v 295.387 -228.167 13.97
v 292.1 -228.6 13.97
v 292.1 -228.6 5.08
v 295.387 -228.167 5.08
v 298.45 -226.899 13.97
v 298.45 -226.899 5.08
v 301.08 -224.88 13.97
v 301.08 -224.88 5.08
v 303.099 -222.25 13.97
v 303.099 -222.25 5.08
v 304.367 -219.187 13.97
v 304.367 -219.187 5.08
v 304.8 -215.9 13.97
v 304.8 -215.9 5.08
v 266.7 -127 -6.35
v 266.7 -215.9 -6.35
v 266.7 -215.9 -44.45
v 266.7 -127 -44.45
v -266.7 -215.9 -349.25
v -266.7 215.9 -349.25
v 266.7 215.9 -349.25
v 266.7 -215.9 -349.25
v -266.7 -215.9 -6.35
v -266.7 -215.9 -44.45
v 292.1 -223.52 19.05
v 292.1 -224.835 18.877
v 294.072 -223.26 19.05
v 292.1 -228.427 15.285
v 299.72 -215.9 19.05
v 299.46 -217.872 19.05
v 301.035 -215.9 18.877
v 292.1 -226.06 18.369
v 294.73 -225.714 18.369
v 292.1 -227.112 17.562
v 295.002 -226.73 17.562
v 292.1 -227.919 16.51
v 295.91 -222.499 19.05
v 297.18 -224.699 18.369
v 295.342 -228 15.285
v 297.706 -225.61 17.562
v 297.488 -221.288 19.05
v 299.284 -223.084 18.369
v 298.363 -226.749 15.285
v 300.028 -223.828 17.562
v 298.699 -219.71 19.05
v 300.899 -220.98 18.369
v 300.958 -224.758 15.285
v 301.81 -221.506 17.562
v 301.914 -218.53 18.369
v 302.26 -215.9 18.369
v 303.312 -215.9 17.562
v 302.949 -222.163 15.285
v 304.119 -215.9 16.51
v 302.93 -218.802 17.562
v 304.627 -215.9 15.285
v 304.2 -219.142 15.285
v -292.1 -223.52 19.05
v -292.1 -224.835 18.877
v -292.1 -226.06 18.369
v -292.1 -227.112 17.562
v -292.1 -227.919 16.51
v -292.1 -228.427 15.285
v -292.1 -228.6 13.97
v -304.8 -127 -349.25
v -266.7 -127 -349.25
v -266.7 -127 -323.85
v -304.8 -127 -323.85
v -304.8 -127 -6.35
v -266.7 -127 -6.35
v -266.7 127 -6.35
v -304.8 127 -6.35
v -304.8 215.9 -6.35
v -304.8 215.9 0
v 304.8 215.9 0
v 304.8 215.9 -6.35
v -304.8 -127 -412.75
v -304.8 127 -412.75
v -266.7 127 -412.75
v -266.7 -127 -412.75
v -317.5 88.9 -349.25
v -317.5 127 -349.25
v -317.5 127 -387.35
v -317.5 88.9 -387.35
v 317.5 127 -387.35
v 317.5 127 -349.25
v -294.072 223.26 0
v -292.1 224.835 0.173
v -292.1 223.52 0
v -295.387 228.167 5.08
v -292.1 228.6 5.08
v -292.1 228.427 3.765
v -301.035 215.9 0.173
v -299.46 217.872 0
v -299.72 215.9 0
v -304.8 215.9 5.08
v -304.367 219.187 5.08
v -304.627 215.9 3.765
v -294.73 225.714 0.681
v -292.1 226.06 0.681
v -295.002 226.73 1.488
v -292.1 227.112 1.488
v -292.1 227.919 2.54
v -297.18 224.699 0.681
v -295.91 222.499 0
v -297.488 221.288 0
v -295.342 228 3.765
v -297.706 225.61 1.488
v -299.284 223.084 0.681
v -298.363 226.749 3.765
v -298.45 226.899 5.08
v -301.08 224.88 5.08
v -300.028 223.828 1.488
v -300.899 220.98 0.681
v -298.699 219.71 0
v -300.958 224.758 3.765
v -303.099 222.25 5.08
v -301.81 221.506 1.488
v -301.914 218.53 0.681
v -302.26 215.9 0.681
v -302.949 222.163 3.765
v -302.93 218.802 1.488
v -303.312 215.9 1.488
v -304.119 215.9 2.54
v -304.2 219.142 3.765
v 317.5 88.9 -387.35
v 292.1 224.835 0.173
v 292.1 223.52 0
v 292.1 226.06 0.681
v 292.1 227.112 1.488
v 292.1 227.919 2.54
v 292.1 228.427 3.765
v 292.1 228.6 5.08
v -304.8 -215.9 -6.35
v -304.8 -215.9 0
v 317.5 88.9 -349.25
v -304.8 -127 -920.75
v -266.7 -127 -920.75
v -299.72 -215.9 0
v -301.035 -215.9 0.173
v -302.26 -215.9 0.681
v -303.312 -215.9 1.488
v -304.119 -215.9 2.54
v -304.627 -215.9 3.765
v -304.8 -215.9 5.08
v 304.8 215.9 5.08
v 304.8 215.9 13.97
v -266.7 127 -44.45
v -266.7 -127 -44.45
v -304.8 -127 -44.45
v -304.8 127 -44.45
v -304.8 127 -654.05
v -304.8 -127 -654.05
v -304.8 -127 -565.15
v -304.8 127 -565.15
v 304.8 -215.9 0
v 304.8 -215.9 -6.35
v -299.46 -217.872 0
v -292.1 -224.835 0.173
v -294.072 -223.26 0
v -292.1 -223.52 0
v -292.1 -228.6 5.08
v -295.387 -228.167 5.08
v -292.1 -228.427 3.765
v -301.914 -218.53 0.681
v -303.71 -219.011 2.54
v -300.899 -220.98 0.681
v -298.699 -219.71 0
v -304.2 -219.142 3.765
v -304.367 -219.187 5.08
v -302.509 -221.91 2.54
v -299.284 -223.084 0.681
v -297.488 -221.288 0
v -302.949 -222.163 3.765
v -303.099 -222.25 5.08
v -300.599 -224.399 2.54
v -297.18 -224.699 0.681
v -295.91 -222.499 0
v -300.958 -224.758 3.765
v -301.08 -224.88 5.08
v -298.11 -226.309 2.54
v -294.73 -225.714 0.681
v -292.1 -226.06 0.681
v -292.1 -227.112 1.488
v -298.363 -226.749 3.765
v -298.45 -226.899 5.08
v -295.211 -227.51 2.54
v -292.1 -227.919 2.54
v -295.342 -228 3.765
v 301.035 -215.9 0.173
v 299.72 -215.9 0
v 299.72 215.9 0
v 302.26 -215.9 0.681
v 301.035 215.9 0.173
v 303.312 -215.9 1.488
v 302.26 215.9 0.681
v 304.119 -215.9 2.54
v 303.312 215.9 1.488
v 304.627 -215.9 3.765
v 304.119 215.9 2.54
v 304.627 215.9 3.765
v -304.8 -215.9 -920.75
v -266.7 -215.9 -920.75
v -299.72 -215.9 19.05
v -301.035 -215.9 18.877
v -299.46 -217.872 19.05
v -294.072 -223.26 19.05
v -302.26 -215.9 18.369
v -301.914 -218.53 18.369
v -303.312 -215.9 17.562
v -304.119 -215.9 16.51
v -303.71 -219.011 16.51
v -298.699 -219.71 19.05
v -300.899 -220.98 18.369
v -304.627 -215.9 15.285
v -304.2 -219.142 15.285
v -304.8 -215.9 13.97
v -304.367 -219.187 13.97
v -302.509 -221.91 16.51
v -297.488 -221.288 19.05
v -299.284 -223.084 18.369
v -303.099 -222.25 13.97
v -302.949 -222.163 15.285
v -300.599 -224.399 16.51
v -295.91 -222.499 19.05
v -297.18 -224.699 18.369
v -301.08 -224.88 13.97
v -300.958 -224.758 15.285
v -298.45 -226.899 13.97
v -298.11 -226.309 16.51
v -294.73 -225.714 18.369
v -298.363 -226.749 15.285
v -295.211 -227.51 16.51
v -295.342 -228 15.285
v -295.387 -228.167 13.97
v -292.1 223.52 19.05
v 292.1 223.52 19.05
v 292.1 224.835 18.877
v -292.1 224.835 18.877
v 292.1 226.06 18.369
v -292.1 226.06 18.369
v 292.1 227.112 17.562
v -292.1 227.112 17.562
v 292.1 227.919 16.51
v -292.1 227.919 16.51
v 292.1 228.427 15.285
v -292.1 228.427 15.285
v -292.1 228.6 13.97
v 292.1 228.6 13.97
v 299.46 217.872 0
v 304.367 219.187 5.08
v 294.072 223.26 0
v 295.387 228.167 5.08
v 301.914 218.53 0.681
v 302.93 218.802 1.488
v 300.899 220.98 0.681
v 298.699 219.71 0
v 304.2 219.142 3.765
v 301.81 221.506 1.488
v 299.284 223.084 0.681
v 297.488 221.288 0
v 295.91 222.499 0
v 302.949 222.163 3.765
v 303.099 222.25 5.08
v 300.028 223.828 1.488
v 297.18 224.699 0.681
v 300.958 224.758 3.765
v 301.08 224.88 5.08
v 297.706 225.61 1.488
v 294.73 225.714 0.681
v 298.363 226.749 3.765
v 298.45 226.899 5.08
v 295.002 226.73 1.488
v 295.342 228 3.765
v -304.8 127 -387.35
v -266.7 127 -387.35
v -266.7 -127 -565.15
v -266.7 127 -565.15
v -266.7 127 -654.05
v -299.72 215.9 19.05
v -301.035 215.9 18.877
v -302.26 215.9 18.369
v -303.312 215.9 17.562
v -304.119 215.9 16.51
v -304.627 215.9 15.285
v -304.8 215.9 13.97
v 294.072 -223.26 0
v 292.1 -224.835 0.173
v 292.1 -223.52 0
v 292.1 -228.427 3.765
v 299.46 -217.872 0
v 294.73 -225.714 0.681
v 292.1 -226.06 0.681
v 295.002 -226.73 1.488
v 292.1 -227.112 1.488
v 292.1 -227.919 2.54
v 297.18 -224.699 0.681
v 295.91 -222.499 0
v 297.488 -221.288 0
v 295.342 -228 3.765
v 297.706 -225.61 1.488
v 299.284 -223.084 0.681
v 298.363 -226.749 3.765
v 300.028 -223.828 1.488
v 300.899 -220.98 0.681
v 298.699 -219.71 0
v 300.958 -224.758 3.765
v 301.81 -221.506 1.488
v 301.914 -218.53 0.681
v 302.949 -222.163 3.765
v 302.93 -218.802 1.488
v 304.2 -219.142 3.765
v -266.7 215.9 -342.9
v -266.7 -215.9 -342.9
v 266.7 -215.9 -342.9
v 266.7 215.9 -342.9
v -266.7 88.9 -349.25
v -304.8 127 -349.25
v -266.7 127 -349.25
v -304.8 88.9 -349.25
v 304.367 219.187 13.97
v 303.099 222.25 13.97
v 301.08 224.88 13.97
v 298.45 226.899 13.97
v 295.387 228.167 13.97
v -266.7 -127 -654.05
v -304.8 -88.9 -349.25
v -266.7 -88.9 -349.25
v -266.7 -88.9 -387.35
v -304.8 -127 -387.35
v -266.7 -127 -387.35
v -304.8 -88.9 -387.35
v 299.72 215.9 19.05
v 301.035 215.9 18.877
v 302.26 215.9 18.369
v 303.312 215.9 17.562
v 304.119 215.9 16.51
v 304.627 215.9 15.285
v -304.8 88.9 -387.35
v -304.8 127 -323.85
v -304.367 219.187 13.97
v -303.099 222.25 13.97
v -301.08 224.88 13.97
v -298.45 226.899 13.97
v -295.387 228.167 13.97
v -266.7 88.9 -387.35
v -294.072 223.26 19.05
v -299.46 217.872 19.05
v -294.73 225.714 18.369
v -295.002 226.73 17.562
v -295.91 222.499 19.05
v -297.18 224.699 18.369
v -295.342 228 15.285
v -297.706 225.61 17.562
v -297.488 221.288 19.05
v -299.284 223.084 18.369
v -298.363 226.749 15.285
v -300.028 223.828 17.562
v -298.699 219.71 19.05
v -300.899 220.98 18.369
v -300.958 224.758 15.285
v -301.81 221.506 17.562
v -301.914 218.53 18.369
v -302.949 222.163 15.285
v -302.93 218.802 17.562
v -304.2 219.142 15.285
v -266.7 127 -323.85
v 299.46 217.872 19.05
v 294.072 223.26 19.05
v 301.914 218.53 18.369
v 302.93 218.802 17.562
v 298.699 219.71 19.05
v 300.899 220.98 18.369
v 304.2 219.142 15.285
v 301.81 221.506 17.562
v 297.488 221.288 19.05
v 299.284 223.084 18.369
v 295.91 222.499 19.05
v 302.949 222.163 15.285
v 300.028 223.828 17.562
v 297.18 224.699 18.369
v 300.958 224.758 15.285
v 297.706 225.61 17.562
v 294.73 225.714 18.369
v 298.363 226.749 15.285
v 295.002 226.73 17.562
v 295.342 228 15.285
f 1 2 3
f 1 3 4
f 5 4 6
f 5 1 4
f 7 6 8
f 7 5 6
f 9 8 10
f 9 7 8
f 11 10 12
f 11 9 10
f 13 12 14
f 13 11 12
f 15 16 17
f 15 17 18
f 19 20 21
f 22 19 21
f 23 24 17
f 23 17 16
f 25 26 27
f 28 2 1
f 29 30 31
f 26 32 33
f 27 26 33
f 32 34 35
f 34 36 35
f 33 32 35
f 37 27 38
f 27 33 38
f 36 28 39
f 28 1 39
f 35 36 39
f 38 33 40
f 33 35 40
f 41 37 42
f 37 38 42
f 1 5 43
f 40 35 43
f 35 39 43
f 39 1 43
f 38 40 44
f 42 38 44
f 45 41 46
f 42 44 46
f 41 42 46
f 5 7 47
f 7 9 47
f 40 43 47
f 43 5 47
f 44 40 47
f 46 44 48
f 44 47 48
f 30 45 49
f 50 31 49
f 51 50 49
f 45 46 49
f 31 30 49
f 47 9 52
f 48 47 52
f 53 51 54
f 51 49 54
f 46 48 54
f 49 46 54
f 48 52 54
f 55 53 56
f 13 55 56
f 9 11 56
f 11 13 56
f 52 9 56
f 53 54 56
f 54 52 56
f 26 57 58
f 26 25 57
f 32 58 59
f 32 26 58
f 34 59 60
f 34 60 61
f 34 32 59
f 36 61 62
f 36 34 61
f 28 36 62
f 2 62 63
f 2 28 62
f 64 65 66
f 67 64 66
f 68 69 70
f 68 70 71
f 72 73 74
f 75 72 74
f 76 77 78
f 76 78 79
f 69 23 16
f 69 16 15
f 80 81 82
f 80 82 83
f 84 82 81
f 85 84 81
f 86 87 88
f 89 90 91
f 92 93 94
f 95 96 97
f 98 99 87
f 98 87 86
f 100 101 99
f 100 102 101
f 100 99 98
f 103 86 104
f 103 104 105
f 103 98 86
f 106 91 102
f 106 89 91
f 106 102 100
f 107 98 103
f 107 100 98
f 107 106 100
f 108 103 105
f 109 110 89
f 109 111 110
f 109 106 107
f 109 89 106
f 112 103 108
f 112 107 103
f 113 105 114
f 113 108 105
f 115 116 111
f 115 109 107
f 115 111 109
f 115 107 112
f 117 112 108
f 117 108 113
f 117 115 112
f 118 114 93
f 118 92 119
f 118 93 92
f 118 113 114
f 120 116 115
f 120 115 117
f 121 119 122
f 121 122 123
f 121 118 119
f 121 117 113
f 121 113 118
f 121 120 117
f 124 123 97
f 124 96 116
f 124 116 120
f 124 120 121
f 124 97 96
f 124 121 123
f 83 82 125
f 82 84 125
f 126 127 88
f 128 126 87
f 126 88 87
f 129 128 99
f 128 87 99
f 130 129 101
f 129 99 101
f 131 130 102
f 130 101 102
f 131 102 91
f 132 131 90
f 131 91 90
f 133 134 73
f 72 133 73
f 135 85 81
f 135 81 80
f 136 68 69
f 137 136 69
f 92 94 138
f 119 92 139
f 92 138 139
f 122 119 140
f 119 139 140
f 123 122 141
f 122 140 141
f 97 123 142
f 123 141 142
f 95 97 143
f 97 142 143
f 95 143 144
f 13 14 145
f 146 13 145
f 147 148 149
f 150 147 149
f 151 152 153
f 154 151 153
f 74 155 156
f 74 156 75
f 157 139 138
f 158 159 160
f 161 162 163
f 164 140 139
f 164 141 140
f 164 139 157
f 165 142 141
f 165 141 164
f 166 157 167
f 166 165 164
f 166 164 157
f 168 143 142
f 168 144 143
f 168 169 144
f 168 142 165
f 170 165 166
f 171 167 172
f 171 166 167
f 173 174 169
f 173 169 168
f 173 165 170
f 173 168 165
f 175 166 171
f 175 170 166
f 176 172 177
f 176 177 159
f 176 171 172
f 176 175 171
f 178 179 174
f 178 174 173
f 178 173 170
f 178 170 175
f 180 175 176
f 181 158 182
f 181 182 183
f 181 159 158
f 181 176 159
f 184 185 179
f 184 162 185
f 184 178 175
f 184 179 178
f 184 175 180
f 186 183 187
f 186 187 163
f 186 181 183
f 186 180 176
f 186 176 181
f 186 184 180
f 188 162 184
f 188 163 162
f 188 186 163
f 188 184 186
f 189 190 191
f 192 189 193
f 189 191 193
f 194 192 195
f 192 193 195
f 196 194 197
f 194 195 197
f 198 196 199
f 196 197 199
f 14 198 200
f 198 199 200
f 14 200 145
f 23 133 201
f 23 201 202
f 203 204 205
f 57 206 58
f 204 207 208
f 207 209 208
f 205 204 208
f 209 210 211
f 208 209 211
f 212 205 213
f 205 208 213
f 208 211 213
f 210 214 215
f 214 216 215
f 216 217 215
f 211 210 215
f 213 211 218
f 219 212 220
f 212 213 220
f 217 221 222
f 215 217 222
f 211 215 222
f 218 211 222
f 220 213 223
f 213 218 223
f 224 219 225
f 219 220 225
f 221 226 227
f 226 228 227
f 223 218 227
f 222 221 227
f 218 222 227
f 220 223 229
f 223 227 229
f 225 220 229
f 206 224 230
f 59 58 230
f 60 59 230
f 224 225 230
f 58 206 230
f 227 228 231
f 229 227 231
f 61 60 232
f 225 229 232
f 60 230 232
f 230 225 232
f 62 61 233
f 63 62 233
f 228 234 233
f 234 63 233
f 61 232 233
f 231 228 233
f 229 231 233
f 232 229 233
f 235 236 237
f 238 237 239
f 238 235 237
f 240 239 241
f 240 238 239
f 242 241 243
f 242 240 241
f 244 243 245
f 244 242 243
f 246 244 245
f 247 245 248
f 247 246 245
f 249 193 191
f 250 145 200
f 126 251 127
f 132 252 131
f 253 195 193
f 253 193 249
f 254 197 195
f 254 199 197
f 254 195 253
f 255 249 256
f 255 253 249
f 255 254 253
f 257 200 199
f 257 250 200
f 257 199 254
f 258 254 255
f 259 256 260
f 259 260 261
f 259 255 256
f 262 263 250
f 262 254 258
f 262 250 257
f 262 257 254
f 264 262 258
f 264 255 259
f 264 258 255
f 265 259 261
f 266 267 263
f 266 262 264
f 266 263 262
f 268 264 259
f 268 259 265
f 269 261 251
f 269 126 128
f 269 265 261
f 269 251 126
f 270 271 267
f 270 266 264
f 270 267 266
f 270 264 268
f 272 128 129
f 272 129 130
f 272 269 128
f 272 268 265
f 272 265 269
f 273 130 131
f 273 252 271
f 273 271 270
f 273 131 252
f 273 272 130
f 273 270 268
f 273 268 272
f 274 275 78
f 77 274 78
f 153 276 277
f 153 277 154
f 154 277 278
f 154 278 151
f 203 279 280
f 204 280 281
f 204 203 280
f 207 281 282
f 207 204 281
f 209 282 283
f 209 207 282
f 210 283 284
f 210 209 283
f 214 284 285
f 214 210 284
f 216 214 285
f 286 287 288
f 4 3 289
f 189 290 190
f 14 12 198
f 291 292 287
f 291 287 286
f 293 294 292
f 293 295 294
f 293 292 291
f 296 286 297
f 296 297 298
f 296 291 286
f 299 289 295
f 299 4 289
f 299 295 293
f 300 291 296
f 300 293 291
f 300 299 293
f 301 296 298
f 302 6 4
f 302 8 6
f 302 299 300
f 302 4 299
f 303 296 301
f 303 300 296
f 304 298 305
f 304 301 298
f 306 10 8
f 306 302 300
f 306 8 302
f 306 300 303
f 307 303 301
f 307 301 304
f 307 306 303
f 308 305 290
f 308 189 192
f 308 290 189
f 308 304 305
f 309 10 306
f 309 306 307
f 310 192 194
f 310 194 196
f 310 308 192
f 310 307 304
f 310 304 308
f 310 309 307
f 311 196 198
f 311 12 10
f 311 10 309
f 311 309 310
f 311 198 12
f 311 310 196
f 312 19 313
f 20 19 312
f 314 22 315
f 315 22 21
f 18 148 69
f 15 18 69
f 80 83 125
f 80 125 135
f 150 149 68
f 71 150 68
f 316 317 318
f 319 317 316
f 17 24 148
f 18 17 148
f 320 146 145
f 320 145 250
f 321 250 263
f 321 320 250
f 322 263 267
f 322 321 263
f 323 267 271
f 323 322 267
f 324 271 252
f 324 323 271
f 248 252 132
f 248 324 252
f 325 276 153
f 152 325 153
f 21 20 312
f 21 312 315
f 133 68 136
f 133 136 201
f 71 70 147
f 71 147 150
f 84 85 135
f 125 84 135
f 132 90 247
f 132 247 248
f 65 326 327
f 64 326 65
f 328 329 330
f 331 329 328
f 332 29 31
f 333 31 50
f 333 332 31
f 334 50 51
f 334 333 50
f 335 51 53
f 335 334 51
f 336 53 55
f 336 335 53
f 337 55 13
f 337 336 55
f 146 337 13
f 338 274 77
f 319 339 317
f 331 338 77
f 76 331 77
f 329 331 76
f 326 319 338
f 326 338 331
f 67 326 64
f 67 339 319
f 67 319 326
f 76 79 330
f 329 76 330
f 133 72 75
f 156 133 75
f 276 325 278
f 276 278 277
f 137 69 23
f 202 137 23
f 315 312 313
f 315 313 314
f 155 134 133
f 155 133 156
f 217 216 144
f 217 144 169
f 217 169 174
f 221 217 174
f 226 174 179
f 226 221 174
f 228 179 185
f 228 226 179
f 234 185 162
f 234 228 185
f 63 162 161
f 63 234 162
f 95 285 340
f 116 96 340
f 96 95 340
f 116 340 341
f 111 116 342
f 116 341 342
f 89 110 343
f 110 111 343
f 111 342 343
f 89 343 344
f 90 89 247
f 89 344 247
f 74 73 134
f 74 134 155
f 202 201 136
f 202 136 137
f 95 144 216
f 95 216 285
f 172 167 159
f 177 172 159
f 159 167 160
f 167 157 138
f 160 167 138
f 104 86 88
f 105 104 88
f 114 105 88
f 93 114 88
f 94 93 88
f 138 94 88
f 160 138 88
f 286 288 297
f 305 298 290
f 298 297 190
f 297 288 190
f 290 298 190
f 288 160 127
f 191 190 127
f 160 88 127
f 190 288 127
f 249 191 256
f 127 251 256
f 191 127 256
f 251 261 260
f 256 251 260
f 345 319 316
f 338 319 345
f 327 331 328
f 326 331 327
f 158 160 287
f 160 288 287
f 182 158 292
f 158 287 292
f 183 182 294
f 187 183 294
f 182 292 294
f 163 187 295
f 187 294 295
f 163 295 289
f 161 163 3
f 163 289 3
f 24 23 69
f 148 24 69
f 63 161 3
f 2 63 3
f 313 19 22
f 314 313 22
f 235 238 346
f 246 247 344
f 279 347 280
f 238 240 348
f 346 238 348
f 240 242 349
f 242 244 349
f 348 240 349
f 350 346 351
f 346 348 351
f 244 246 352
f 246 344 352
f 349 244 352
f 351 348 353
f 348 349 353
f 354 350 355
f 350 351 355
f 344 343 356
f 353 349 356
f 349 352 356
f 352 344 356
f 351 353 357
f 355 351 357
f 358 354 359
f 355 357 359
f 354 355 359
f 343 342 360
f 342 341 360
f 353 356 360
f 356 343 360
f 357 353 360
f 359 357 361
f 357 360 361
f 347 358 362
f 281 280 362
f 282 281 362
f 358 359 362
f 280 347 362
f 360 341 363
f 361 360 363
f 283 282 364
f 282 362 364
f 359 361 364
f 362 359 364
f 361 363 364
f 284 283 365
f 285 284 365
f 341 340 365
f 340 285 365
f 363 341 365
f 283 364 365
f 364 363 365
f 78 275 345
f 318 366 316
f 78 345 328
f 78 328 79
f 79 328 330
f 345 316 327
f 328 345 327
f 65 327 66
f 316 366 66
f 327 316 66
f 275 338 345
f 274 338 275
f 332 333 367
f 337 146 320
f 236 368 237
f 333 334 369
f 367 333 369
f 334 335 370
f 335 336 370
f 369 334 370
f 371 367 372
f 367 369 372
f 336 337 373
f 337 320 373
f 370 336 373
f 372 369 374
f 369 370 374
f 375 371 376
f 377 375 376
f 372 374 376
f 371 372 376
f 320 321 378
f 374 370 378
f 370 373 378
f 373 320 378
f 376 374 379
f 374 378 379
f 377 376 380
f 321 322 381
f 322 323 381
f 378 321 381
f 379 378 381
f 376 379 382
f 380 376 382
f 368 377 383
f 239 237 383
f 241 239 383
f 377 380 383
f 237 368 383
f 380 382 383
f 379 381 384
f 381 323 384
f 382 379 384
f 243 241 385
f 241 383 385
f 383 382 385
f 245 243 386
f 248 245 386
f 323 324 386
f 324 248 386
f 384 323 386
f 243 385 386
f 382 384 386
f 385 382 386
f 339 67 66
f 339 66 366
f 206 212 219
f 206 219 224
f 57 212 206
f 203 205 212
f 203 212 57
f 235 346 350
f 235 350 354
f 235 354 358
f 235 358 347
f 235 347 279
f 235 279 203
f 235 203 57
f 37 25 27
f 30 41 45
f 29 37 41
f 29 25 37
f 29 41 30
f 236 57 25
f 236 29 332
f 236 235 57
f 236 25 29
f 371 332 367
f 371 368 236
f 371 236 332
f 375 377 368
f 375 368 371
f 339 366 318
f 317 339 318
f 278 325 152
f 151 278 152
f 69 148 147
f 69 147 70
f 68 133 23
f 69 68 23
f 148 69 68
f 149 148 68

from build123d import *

# Parameters (mm, degrees)
F0_W           = 609.6
F0_H           = 431.8
F1_DEPTH       = 6.35
F2_W           = 38.1
F2_H           = 88.9
F3_DEPTH       = 914.4
F4_W           = 88.9
F4_H           = 38.1
F5_DEPTH       = 533.4
F6_W           = 38.1
F6_H           = 38.1
F7_DEPTH       = 254
F8_W           = 38.1
F8_H           = 88.9
F9_DEPTH       = 254
F11_DEPTH      = 38.1
F12_W          = 38.1
F12_H          = 38.1
F13_DEPTH      = 622.3
F13_DEPTH_BACK = 12.7
F14_W          = 533.4
F14_H          = 431.8
F15_DEPTH      = 6.35
F16_W          = 609.6
F16_H          = 457.2
F17_DEPTH      = 19.05
F18_R          = 12.7
F19_R          = 5.08


with BuildPart() as f1:
    # F0 (on Top) → F1 (new body)
    with BuildSketch(Plane.XY):
        Rectangle(F0_W, F0_H)
    extrude(amount=-F1_DEPTH)


with BuildPart() as f3:
    # F2 (on face) → F3 (new body)
    with BuildSketch(Plane(origin=(0, 0, -6.35), x_dir=(1, 0, 0), z_dir=(0, 0, -1))):
        with Locations((-285.75, 171.45)):
            Rectangle(F2_W, F2_H)
    extrude(amount=F3_DEPTH)


with BuildPart() as f5:
    # F4 (on face) → F5 (new body)
    with BuildSketch(Plane.YZ.offset(-266.7)):
        with Locations((-171.45, -25.4)):
            Rectangle(F4_W, F4_H)
    extrude(amount=F5_DEPTH)


with BuildPart() as f7:
    # F6 (on face) → F7 (new body)
    with BuildSketch(Plane(origin=(0, -127, 0), x_dir=(-1, 0, 0), z_dir=(0, 1, 0))):
        with Locations((285.75, -25.4)):
            Rectangle(F6_W, F6_H)
    extrude(amount=F7_DEPTH)


with BuildPart() as f9:
    # F8 (on face) → F9 (new body)
    with BuildSketch(Plane(origin=(0, -127, 0), x_dir=(-1, 0, 0), z_dir=(0, 1, 0))):
        with Locations((285.75, -609.6)):
            Rectangle(F8_W, F8_H)
    extrude(amount=F9_DEPTH)


with BuildPart() as f11:
    # F10 (on face) → F11 (new body)
    with BuildSketch(Plane(origin=(-304.8, 0, 0), x_dir=(0, -1, 0), z_dir=(-1, 0, 0))):
        Polygon((127, -349.25), (127, -323.85), (-127, -323.85), (-127, -349.25), (-88.9, -349.25), (-88.9, -387.35), (-127, -387.35), (-127, -412.75), (127, -412.75), (127, -387.35), (88.9, -387.35), (88.9, -349.25), align=None)
    extrude(amount=-F11_DEPTH)


with BuildPart() as f13:
    # F12 (on face) → F13 (new body, two sides)
    with BuildSketch(Plane(origin=(-304.8, 0, 0), x_dir=(0, -1, 0), z_dir=(-1, 0, 0))) as f13_sk:
        with Locations((-107.95, -368.3)):
            Rectangle(F12_W, F12_H)
    extrude(amount=-F13_DEPTH)
    extrude(f13_sk.sketch, amount=F13_DEPTH_BACK)


with BuildPart() as f15:
    # F14 (on face) → F15 (new body)
    with BuildSketch(Plane.XY.offset(-349.25)):
        Rectangle(F14_W, F14_H)
    extrude(amount=F15_DEPTH)


with BuildPart() as f17:
    # F16 (on face) → F17 (new body)
    with BuildSketch(Plane.XY):
        Rectangle(F16_W, F16_H)
    extrude(amount=F17_DEPTH)

    # F18
    f18_edges = [f17.edges().sort_by_distance(p)[0] for p in [
        (304.8, -228.6, 9.525),
        (-304.8, -228.6, 9.525),
        (-304.8, 228.6, 9.525),
        (304.8, 228.6, 9.525),
    ]]
    fillet(f18_edges, radius=F18_R)

    # F19
    f19_edges = [f17.edges().sort_by_distance(p)[0] for p in [
        (0, -228.6, 0),
        (-301.080256, -224.880256, 0),
        (301.080256, -224.880256, 0),
        (-304.8, 0, 0),
        (304.8, 0, 0),
        (-301.080256, 224.880256, 0),
        (301.080256, 224.880256, 0),
        (0, 228.6, 0),
        (0, -228.6, 19.05),
        (-301.080256, -224.880256, 19.05),
        (301.080256, -224.880256, 19.05),
        (-304.8, 0, 19.05),
        (304.8, 0, 19.05),
        (-301.080256, 224.880256, 19.05),
        (301.080256, 224.880256, 19.05),
        (0, 228.6, 19.05),
    ]]
    fillet(f19_edges, radius=F19_R)


solid = Compound([f1.part, f3.part, f5.part, f7.part, f9.part, f11.part, f13.part, f15.part, f17.part])
